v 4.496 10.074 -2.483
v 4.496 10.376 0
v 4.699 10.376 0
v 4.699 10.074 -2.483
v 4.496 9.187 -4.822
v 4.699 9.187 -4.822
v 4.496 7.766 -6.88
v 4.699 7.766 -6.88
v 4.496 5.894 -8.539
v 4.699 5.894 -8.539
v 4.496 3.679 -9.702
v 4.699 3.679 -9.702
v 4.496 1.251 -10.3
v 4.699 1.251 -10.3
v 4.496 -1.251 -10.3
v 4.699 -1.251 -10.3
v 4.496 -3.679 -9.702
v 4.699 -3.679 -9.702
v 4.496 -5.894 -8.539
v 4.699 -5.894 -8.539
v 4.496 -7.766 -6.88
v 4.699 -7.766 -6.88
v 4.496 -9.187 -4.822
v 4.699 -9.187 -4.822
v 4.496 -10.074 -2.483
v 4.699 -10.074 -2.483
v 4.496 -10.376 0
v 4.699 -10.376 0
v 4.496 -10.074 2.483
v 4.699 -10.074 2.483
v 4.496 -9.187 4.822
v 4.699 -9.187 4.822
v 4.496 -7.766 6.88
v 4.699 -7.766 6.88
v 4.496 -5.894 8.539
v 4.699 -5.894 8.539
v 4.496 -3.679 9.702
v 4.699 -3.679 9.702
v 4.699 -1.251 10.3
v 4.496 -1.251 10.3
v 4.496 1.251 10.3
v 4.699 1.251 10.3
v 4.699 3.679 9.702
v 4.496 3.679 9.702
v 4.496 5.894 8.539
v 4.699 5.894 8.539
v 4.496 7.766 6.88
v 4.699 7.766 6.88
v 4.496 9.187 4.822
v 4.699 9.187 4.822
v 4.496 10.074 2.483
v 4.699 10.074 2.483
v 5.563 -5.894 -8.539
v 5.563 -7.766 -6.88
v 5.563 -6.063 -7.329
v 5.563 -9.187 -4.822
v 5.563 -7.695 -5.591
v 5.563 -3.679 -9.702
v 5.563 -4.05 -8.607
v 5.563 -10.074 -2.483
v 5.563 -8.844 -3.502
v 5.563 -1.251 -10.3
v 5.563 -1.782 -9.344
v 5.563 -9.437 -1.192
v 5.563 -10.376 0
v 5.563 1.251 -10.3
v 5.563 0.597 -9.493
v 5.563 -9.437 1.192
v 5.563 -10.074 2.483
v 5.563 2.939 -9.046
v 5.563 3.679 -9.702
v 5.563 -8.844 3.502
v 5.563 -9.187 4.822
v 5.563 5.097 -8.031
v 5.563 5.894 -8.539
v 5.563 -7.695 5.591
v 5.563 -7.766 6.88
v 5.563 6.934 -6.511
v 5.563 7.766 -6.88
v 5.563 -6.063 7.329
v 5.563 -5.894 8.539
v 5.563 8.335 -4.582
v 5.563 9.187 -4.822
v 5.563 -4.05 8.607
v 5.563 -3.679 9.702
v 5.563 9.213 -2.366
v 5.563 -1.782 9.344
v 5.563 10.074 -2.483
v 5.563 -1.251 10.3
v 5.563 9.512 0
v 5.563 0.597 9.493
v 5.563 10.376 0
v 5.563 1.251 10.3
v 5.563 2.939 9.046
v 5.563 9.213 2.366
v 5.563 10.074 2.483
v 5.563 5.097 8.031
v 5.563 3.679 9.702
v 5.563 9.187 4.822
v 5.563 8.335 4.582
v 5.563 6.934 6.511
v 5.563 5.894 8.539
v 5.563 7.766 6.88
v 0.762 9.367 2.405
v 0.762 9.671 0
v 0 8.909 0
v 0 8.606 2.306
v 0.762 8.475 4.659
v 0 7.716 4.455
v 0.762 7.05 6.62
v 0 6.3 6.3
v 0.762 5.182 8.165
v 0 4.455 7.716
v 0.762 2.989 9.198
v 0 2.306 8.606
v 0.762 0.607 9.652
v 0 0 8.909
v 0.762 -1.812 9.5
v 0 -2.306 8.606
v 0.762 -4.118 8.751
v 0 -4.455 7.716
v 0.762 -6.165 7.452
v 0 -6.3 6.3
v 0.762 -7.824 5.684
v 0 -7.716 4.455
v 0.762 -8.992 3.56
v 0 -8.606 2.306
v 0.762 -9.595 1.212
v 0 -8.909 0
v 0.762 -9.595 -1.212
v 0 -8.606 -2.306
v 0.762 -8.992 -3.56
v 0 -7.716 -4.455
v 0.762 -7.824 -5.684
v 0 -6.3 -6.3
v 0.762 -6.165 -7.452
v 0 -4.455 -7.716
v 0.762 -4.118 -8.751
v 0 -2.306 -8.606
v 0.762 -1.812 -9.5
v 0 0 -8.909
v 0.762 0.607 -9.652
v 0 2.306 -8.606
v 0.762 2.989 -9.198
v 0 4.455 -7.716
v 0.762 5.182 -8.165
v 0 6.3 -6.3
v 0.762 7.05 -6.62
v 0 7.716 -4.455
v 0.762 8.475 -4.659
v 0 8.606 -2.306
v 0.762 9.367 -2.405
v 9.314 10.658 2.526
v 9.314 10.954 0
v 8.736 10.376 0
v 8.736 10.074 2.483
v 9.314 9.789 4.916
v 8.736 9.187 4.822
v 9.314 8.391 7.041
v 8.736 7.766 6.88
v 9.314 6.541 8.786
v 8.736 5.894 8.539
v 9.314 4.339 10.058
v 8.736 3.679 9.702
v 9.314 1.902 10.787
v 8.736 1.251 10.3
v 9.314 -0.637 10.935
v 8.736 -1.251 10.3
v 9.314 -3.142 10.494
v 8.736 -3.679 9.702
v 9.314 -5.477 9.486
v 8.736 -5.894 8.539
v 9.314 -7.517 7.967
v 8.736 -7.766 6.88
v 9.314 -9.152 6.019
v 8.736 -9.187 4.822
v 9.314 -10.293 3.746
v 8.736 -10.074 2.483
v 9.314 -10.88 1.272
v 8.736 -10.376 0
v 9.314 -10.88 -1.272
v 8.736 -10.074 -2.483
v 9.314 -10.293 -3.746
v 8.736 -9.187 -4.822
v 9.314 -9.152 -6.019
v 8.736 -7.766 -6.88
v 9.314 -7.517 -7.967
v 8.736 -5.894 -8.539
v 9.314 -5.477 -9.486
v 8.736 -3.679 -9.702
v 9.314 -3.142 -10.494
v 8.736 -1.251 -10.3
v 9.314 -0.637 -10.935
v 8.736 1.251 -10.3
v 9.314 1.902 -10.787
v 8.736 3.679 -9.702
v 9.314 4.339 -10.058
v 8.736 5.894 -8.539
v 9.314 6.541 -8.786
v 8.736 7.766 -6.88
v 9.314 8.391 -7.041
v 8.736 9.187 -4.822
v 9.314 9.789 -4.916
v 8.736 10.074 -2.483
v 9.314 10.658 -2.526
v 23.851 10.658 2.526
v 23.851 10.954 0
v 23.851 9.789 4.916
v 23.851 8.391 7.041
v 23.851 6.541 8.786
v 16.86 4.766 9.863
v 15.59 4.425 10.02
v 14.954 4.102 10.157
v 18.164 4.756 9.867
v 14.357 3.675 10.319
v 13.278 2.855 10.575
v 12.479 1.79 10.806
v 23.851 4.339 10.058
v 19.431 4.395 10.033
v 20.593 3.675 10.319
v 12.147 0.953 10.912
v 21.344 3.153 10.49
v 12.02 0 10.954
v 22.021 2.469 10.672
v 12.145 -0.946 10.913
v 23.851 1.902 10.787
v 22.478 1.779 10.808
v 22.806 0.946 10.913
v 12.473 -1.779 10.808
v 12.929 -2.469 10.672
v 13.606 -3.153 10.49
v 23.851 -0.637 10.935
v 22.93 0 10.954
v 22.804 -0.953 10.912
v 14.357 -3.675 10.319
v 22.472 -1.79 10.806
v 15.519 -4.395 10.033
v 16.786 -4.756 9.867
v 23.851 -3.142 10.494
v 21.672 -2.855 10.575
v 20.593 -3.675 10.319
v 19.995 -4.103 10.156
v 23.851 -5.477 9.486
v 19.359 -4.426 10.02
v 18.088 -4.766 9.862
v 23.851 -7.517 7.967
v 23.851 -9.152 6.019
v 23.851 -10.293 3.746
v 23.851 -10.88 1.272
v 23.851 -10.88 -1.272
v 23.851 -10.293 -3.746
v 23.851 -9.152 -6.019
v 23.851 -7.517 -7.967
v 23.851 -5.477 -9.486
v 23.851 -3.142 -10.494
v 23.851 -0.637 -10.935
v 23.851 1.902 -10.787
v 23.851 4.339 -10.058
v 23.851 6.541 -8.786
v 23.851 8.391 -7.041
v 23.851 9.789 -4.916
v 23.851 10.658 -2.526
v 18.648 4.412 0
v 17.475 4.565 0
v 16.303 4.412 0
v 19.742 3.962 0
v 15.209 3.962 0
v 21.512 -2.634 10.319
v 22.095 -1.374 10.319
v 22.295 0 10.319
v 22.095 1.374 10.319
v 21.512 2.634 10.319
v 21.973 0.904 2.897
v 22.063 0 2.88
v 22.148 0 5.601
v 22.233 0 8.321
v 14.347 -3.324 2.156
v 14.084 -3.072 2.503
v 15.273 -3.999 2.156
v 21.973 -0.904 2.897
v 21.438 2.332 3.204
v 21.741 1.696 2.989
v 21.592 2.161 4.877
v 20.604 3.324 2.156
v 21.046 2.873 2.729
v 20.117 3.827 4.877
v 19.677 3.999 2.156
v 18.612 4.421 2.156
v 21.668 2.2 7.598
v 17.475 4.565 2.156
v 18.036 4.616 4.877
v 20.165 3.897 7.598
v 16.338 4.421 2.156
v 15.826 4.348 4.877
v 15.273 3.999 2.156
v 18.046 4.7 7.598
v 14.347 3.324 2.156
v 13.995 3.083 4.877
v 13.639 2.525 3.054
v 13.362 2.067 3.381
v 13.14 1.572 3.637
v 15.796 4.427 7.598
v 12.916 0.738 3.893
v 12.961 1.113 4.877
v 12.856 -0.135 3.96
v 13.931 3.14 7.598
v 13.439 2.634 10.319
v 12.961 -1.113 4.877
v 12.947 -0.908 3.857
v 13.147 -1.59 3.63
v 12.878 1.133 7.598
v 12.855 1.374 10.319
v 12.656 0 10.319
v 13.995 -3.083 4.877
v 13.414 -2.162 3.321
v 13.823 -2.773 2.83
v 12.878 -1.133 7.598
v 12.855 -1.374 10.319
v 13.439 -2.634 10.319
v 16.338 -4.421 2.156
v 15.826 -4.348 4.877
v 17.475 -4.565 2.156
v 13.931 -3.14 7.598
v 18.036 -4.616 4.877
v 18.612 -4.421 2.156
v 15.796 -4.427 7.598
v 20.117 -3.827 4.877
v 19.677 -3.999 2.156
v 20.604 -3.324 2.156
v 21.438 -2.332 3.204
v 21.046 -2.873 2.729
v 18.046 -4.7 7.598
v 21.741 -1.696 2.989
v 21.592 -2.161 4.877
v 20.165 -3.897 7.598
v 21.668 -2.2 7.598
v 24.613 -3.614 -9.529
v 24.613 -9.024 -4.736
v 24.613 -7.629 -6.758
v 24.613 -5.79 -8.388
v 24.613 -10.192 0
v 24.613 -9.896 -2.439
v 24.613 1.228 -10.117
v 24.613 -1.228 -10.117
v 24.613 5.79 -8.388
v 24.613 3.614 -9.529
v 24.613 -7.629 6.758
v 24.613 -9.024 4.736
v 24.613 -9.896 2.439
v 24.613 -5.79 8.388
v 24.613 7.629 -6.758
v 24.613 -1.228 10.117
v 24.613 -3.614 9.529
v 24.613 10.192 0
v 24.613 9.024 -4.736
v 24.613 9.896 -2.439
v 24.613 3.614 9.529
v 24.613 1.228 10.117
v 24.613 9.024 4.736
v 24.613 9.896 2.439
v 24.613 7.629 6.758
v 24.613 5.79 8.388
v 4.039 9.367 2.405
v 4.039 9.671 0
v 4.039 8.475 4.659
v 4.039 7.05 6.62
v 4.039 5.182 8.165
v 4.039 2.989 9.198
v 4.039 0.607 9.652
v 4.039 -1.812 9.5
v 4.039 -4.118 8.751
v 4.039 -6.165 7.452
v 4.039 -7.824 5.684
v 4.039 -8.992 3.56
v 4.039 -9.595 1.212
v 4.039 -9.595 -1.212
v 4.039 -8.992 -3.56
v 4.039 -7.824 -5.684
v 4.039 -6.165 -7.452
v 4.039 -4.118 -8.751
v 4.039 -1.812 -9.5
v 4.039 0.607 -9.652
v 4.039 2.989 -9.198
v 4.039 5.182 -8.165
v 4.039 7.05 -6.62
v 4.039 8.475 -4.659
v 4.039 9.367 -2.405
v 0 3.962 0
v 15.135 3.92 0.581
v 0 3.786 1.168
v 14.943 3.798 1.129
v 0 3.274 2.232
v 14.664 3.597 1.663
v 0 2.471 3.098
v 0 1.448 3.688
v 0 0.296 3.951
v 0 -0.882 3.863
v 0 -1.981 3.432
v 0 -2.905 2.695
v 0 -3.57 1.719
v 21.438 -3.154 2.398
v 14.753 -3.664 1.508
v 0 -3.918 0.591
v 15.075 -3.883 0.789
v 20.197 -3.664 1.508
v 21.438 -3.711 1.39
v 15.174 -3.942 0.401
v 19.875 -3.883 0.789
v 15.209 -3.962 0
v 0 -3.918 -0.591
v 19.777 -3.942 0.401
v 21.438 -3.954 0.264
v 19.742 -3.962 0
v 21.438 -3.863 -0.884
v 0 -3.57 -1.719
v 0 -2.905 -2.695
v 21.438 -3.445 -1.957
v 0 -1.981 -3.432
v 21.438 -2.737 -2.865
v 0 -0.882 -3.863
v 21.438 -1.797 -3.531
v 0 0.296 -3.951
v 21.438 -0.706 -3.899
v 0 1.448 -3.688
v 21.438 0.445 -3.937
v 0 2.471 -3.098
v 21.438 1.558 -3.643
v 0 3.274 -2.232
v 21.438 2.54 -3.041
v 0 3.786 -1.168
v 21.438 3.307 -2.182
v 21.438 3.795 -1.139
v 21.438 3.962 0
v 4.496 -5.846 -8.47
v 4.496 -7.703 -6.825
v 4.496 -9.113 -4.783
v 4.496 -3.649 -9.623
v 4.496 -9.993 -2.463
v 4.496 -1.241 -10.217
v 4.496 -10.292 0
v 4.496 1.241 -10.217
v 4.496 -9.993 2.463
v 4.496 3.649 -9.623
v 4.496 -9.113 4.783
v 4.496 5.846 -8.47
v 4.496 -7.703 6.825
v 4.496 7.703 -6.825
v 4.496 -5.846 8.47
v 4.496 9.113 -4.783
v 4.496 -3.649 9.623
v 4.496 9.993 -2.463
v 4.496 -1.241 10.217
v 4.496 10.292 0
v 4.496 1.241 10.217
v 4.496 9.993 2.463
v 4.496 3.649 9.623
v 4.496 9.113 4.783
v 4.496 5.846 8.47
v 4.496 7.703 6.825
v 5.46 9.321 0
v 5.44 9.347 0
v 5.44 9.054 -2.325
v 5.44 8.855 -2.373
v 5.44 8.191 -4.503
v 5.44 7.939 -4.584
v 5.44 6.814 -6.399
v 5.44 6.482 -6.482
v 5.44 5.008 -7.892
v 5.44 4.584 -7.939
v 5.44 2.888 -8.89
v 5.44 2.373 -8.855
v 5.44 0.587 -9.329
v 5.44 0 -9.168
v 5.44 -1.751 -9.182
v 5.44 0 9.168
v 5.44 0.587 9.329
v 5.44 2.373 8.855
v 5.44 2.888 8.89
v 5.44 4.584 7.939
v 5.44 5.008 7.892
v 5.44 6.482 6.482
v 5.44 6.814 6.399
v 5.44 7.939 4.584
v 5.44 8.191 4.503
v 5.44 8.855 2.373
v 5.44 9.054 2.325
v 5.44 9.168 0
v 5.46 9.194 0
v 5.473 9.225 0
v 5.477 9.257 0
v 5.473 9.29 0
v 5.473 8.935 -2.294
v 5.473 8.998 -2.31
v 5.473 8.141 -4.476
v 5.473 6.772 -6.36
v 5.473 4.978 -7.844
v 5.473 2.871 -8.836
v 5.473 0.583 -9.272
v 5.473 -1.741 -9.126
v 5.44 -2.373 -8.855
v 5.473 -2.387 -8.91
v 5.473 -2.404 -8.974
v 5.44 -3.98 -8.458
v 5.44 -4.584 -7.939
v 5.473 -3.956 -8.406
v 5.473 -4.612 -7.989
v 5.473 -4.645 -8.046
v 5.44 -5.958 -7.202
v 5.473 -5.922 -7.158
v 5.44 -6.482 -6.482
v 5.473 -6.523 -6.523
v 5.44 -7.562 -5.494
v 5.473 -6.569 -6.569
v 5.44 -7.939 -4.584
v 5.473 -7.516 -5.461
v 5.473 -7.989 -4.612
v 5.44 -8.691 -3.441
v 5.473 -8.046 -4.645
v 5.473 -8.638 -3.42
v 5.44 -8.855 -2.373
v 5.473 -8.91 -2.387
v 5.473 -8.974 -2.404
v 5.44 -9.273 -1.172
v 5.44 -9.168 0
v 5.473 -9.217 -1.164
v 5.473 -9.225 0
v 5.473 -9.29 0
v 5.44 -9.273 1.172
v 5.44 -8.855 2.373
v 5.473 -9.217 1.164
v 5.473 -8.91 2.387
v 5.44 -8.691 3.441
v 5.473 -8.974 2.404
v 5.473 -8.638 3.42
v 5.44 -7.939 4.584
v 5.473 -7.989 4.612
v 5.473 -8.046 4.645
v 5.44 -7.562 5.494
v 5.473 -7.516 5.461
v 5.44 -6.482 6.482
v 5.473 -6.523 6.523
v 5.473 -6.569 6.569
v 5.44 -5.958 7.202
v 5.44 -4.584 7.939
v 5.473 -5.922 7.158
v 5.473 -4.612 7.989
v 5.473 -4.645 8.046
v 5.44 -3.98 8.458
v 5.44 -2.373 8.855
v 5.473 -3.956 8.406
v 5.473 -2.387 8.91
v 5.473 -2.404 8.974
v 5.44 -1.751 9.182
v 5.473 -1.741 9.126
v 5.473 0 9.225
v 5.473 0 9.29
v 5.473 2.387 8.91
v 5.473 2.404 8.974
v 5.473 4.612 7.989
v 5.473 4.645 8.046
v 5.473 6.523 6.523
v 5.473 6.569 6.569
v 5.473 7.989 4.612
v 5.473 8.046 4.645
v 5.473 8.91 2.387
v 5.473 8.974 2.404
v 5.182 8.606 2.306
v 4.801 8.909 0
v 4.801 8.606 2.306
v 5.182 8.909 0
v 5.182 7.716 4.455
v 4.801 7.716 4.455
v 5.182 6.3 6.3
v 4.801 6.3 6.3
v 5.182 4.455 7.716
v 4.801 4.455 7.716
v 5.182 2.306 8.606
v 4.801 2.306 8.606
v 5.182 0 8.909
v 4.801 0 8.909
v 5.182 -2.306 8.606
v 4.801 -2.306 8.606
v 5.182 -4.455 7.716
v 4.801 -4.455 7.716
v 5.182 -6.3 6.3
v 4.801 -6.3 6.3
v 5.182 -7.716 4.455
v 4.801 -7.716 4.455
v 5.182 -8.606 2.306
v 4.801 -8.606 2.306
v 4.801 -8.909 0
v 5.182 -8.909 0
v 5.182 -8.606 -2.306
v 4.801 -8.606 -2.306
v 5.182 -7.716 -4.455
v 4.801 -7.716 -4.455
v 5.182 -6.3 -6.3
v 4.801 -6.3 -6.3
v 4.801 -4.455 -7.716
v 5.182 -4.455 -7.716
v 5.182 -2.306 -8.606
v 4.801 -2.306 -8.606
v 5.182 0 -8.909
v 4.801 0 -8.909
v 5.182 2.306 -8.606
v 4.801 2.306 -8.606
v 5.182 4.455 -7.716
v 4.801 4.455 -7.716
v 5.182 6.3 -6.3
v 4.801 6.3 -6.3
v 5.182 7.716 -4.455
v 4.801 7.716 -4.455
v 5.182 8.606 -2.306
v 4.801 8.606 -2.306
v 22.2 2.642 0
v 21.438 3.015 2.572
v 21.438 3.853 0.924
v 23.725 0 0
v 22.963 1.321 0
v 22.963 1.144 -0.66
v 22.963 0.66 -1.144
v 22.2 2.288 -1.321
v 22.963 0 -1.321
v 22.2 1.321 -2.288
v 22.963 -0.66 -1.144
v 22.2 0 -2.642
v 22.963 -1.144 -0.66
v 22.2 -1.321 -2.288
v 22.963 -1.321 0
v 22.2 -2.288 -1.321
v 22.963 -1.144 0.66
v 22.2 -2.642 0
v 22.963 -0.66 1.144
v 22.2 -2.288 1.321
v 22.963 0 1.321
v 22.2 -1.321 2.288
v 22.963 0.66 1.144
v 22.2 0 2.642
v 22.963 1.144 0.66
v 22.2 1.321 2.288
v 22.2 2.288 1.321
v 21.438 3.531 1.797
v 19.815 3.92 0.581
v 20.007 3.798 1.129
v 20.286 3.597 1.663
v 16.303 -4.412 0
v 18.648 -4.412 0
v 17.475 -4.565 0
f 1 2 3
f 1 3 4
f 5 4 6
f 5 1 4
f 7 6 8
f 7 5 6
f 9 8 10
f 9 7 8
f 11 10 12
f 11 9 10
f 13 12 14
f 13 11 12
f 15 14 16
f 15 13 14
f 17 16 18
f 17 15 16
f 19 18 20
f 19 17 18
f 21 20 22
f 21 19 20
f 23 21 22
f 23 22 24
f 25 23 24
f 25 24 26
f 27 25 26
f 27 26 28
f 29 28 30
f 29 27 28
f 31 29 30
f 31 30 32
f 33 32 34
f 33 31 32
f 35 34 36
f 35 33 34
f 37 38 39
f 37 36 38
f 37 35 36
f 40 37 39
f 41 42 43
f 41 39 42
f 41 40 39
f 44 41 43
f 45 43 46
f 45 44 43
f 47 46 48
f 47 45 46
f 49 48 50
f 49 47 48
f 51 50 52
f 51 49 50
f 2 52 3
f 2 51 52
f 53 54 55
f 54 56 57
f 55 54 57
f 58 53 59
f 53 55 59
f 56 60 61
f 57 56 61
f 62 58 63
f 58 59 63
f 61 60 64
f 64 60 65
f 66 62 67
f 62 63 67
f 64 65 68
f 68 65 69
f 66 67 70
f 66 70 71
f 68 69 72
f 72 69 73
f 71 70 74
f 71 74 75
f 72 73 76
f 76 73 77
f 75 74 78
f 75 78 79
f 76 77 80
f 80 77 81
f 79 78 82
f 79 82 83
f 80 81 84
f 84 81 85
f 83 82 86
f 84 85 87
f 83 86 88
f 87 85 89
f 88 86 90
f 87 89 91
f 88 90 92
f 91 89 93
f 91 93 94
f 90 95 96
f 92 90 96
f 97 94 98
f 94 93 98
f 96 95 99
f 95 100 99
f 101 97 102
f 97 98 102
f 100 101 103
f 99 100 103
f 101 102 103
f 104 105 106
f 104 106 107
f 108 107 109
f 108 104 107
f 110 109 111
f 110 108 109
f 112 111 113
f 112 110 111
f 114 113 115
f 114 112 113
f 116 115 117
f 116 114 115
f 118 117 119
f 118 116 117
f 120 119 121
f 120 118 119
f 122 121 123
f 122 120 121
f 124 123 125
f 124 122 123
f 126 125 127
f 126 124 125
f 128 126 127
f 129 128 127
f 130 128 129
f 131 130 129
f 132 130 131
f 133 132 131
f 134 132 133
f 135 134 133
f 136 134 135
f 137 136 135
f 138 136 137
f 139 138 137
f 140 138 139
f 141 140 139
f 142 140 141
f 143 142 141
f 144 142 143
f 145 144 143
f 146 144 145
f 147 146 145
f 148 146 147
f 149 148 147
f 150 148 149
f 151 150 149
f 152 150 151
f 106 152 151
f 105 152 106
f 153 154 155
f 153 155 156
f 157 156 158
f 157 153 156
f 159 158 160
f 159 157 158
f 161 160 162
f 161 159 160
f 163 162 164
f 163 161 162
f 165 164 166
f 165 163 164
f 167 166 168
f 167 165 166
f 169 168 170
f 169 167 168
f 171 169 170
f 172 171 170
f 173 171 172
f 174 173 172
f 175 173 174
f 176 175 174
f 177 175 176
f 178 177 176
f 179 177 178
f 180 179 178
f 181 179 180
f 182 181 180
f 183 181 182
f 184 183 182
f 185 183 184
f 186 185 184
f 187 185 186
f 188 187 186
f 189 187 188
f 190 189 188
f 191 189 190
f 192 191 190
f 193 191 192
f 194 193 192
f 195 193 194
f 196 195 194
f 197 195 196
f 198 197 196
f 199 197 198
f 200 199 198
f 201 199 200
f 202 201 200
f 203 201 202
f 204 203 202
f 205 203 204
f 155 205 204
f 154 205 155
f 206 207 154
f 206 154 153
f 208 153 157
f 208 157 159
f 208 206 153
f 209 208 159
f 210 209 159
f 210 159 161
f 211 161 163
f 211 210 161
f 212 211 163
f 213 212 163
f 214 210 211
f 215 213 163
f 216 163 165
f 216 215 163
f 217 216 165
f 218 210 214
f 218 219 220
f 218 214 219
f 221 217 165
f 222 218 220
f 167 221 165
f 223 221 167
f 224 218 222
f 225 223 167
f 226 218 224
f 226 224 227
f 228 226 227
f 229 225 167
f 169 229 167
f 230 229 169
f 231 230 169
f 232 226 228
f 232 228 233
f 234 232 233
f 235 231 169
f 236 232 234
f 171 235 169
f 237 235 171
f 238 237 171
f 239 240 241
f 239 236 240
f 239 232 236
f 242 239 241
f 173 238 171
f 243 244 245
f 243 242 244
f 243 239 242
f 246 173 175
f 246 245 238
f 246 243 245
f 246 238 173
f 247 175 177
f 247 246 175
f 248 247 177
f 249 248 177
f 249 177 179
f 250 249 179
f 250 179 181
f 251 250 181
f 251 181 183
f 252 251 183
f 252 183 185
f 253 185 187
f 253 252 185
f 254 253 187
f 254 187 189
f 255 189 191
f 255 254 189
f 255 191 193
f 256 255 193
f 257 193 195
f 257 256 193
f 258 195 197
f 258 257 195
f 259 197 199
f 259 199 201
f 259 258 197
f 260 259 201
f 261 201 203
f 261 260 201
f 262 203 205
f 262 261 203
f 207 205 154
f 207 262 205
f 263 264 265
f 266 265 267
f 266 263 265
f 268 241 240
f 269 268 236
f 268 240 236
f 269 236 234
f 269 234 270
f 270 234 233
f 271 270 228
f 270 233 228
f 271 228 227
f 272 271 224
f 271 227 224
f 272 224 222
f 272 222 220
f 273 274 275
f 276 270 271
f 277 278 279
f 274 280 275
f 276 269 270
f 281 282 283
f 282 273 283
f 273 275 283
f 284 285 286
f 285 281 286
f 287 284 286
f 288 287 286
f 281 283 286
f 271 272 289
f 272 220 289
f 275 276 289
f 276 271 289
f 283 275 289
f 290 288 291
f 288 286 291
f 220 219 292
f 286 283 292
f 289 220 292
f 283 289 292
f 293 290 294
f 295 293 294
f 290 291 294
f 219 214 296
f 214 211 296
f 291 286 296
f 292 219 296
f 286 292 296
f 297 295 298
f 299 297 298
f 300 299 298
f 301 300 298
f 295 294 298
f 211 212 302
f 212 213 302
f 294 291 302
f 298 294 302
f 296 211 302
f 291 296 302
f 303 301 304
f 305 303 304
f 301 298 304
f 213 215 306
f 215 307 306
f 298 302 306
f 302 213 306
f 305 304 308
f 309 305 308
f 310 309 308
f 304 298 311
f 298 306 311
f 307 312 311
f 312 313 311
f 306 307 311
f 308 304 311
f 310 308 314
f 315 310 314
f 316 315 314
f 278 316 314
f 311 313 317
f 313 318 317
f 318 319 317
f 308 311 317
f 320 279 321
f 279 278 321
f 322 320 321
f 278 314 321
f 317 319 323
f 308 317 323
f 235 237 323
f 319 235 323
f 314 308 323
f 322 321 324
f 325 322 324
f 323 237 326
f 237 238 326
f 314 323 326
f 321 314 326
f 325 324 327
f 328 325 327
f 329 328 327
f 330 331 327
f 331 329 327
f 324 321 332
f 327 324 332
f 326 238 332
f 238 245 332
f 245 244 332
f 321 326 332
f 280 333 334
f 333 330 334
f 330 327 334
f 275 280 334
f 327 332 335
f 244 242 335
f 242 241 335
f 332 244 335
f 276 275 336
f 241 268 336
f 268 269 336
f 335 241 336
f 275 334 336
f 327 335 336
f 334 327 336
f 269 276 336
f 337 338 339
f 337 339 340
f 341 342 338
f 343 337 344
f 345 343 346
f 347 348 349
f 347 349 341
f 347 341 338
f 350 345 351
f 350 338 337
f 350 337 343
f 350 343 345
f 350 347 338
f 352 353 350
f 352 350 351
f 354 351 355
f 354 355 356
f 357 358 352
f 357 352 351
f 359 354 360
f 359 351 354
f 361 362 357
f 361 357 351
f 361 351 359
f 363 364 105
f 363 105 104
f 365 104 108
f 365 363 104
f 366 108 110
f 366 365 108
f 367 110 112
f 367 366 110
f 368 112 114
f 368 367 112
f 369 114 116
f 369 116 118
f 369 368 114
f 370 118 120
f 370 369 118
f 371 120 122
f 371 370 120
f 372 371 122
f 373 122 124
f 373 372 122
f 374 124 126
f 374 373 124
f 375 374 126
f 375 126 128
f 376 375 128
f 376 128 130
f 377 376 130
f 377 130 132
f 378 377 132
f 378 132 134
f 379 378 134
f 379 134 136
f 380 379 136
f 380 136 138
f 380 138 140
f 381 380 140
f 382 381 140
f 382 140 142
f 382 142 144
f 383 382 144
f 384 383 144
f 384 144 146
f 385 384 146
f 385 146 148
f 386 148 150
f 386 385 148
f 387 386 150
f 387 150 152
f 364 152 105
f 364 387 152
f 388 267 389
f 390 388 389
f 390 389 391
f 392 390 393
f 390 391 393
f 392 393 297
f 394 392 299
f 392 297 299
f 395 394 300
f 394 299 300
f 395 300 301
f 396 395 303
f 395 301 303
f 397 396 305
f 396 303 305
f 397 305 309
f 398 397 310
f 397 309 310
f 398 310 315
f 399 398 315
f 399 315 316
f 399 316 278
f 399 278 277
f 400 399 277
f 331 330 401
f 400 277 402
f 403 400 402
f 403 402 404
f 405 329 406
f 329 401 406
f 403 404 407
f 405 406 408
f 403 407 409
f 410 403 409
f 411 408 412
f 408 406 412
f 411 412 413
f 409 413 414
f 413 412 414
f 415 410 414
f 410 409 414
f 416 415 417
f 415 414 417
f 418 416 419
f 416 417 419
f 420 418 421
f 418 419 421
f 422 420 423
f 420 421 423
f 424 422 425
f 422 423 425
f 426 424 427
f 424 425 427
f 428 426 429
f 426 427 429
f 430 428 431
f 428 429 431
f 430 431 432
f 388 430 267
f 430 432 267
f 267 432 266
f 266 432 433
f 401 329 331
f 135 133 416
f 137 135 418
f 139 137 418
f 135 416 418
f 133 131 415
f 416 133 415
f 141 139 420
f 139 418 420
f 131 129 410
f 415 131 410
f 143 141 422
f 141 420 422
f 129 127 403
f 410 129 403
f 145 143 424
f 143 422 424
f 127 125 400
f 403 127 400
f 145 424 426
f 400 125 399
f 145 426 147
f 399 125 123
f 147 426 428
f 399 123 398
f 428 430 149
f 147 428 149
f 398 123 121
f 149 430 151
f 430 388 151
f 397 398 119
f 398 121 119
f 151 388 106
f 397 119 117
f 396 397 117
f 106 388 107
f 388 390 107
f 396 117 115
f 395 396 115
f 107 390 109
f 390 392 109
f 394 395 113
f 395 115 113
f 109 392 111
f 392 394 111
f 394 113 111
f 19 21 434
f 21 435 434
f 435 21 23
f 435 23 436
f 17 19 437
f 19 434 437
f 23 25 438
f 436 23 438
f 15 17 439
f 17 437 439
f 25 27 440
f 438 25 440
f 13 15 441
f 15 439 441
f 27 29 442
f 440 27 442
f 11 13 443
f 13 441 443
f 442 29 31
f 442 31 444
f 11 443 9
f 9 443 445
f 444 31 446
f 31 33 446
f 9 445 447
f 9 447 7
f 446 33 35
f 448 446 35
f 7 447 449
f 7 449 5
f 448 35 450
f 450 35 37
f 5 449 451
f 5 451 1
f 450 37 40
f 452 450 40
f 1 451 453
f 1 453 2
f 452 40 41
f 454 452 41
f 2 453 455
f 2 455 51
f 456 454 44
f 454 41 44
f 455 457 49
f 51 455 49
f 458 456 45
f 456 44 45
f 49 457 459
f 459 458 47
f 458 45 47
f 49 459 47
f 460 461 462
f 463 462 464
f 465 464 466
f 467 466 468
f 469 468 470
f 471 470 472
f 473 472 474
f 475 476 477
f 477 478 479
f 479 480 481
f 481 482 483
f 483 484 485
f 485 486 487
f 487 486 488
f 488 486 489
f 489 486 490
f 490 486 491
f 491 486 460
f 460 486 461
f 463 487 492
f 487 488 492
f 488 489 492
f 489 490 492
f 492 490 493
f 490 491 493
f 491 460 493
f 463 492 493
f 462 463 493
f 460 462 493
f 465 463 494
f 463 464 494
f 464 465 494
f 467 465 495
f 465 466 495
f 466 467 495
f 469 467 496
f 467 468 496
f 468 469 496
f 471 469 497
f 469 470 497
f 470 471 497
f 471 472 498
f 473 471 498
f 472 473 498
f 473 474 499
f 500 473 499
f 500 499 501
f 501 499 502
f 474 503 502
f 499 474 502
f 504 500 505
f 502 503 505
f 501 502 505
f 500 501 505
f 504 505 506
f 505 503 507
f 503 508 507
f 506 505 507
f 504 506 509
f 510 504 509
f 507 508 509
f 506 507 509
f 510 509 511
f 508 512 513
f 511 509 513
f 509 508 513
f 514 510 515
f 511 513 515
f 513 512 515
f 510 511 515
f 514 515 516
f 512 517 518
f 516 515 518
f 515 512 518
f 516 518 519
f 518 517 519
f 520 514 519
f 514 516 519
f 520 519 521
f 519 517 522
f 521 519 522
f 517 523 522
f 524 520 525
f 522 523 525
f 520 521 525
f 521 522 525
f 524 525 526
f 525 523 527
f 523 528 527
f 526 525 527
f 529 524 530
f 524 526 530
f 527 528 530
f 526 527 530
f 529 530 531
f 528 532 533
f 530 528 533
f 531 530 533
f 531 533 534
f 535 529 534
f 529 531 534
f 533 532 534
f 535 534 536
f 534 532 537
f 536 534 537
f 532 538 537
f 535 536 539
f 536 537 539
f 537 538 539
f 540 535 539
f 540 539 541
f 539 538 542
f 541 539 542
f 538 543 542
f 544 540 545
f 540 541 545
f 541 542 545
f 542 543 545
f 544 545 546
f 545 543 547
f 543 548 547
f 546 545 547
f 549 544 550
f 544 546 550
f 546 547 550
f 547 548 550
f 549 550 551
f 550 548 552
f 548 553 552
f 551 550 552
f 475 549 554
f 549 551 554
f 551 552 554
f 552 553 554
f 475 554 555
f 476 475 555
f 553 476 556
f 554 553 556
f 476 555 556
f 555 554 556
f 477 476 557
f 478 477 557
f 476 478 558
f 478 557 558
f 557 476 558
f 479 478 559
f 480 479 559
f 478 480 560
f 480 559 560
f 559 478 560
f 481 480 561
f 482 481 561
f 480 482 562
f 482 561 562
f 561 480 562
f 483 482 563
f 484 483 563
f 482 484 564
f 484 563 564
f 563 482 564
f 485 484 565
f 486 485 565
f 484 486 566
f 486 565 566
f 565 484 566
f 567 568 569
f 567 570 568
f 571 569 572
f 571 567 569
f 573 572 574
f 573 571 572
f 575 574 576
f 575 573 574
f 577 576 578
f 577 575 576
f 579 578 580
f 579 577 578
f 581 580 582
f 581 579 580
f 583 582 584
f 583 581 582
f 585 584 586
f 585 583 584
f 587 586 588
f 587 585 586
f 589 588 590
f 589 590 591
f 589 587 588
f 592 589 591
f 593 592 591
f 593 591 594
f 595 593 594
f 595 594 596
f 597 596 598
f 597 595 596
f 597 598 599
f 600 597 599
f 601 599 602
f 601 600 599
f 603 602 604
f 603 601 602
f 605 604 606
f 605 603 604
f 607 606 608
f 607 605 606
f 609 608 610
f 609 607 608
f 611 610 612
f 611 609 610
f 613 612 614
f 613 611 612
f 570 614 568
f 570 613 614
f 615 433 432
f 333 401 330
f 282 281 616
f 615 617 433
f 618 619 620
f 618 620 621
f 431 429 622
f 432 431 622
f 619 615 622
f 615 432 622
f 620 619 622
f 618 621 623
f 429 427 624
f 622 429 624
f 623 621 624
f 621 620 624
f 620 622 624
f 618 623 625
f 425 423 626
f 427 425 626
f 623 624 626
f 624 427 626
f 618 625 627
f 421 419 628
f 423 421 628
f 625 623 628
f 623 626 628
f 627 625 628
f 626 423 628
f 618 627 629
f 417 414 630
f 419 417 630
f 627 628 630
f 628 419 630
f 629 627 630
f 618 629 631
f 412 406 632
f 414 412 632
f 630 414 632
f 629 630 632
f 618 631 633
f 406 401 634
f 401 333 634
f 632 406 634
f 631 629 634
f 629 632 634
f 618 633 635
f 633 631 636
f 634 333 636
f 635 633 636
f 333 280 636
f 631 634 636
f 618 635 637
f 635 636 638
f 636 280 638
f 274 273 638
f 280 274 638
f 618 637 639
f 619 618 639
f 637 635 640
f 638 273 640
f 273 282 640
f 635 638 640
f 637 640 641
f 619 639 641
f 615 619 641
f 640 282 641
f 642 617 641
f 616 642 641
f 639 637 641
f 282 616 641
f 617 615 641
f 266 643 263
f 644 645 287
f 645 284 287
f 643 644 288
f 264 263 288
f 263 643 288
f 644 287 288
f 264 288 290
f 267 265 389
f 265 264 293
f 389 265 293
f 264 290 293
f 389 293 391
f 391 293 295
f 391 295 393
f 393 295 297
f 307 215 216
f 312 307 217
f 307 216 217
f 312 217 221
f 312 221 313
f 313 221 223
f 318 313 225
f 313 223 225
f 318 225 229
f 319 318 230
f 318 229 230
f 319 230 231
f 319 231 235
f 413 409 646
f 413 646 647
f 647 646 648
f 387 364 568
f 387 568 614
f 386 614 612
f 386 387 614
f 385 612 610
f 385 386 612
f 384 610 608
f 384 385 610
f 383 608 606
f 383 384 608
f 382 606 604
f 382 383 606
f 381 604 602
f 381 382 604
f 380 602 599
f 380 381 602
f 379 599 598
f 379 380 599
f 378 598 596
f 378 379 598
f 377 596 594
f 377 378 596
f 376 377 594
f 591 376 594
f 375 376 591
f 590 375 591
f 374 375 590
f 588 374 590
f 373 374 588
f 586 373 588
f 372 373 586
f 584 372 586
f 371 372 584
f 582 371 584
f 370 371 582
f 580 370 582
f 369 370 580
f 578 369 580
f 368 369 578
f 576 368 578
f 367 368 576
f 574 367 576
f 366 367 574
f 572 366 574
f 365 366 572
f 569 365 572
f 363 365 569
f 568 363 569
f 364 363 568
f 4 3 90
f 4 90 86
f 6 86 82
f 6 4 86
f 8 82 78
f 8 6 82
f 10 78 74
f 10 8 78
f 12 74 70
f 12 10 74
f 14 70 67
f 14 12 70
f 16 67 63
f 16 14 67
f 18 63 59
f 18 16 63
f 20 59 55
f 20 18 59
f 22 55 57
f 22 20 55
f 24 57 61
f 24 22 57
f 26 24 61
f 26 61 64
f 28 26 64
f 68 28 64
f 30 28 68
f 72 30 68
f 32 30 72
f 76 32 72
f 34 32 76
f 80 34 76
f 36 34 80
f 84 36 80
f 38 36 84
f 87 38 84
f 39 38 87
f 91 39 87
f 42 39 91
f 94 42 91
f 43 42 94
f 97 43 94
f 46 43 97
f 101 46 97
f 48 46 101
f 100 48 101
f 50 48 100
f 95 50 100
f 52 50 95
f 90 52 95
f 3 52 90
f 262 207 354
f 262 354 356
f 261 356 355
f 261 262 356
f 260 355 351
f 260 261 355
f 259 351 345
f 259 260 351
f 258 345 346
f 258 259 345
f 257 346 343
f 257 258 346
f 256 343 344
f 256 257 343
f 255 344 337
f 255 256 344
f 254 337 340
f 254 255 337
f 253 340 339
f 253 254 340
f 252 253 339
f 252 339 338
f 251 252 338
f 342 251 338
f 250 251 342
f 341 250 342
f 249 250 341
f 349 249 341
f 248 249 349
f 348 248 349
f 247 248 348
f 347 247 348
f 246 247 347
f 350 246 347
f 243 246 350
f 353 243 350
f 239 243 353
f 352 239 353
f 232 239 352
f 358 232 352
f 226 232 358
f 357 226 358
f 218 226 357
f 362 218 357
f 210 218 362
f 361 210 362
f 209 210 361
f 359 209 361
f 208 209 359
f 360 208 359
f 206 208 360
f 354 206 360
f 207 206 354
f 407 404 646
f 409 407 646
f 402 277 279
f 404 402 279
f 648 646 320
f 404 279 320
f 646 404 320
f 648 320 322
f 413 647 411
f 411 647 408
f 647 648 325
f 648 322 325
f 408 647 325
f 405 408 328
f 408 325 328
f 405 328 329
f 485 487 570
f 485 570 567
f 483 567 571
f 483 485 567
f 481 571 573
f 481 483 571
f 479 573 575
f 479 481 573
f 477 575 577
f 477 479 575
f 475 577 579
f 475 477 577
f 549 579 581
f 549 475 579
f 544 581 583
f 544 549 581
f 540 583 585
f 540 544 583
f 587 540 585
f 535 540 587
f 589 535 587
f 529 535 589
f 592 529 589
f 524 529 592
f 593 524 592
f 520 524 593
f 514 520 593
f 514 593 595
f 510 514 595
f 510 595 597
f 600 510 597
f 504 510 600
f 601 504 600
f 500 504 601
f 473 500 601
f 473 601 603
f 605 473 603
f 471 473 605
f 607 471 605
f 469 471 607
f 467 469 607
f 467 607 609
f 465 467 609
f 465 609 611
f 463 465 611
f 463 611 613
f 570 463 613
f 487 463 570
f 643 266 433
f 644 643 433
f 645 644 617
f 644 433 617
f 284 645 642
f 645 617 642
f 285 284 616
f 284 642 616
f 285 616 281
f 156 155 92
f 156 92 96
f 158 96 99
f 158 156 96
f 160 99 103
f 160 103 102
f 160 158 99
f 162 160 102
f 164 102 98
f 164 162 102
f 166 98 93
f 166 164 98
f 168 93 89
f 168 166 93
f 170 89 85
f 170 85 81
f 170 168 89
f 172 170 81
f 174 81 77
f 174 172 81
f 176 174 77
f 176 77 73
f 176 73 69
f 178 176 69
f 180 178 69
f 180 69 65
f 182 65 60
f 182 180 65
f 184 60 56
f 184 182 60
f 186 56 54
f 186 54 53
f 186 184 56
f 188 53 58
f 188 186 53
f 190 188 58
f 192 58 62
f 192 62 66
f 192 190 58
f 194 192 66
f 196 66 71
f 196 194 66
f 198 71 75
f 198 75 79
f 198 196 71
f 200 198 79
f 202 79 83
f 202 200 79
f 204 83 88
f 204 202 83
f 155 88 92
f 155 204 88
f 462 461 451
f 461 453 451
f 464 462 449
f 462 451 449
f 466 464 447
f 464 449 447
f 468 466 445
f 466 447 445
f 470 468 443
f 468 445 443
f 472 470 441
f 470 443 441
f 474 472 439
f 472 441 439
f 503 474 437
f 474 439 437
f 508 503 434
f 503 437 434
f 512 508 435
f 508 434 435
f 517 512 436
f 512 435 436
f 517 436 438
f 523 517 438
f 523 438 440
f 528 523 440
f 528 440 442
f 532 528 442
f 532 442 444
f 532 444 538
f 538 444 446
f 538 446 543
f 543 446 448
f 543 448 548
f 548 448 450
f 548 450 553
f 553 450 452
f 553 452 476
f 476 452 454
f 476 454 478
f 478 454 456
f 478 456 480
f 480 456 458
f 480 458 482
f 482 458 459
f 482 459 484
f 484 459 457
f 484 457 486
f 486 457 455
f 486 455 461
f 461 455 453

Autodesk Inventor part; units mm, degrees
sketch "Sketch_8" plane through (0, 0, 0) normal (0, 0, 1) x (1, 0, 0)
  line L0 (24.6126, 0) -> (0, 0)
  line L1 (0, 0) -> (0, 8.9091)
  line L2 (0, 8.9091) -> (0.762, 9.671)
  line L3 (0.762, 9.671) -> (4.0386, 9.671)
  line L4 (4.0386, 9.671) -> (4.8006, 8.9091)
  line L5 (4.8006, 8.9091) -> (5.5626, 8.9091)
  line L6 (5.5626, 8.9091) -> (5.5626, 10.3759)
  line L7 (5.5626, 10.3759) -> (8.7363, 10.3759)
  line L8 (8.7363, 10.3759) -> (9.3142, 10.9537)
  line L9 (9.3142, 10.9537) -> (23.8506, 10.9537)
  line L10 (23.8506, 10.9537) -> (24.6126, 10.1918)
  line L11 (24.6126, 10.1918) -> (24.6126, 0)
  line L12 (24.6126, 0) -> (0, 0)
revolve "Revolution1" add sketch "Sketch_8" angle 360 about axis through (24.6126, 0, 0) along (1, 0, 0)
sketch "Sketch_13" plane through (0, 0, 0) normal (0, 0, 1) x (1, 0, 0)
  line L0 (23.7253, 0) -> (0, 0)
  line L1 (0, 0) -> (0, 3.9624)
  line L2 (0, 3.9624) -> (21.4376, 3.9624)
  line L3 (21.4376, 3.9624) -> (23.7253, 0)
  line L4 (23.7253, 0) -> (0, 0)
revolve "Revolution2" cut sketch "Sketch_13" angle 360 about axis through (23.7253, 0, 0) along (1, 0, 0)
sketch "Sketch_19" plane through (0, 0, 0) normal (0, 1, 0) x (-1, 0, 0)
  line L0 (-17.4752, 10.9537) -> (-17.4752, 0)
  line L1 (-17.4752, 0) -> (-22.04, 0)
  line L2 (-22.04, 0) -> (-22.04, 2.1565)
  line L3 (-22.04, 2.1565) -> (-22.2949, 10.3187)
  line L4 (-22.2949, 10.3187) -> (-22.9299, 10.9537)
  line L5 (-22.9299, 10.9537) -> (-17.4752, 10.9537)
  line L6 (-17.4752, 10.9537) -> (-17.4752, 0)
revolve "Revolution3" cut sketch "Sketch_19" angle 360 about axis through (17.4752, 0, 10.9537) along (0, 0, 1)
sketch "Sketch_24" plane through (0, 0, 0) normal (0, 0, 1) x (1, 0, 0)
  line L0 (5.5626, 0) -> (4.8006, 0)
  line L1 (4.4955, 10.2917) -> (5.4401, 9.3472)
  arc A0 (5.4401, 9.1676) -> (5.4401, 9.3472) centre (5.3503, 9.2574) ccw
  line L2 (5.4401, 9.1676) -> (5.1816, 8.9091)
  line L3 (5.1816, 8.9091) -> (4.8006, 8.9091)
  line L4 (4.8006, 8.9091) -> (4.8006, 8.655)
  line L5 (4.8006, 8.655) -> (5.5626, 8.655)
  line L6 (5.5626, 8.655) -> (5.5626, 9.512)
  line L7 (5.5626, 9.512) -> (4.6987, 10.3759)
  line L8 (4.6987, 10.3759) -> (4.4955, 10.3759)
  line L9 (4.4955, 10.3759) -> (4.4955, 10.2917)
revolve "Revolution4" add sketch "Sketch_24" angle 360 about axis through (5.5626, 0, 0) along (1, 0, 0)
ref_plane "to_tube_XY" through (4.8006, 0, 0) normal (1, 0, 0) x (0, 0, -1)
ref_plane "to_tube_YZ" through (4.8006, 0, 0) normal (0, 0, -1) x (0, 1, 0)
ref_plane "to_tube_ZX" through (4.8006, 0, 0) normal (0, 1, 0) x (1, 0, 0)
ref_plane "to_nut_XY" through (27.0002, 0, 0) normal (1, 0, 0) x (0, 0, -1)
ref_plane "to_nut_YZ" through (27.0002, 0, 0) normal (0, 0, -1) x (0, 1, 0)
ref_plane "to_nut_ZX" through (27.0002, 0, 0) normal (0, 1, 0) x (1, 0, 0)
ref_plane "lovra1_XY" through (35.7124, 0, 0) normal (1, 0, 0) x (0, 0, -1)
ref_plane "lovra1_YZ" through (35.7124, 0, 0) normal (0, 0, -1) x (0, 1, 0)
ref_plane "lovra1_ZX" through (35.7124, 0, 0) normal (0, 1, 0) x (1, 0, 0)
ref_plane "lovra2_XY" through (35.7124, 7.874, 0) normal (1, 0, 0) x (0, 0, -1)
ref_plane "lovra2_YZ" through (35.7124, 7.874, 0) normal (0, 0, -1) x (0, 1, 0)
ref_plane "lovra2_ZX" through (35.7124, 7.874, 0) normal (0, 1, 0) x (1, 0, 0)
ref_plane "lovra3_XY" through (35.7124, -7.874, 0) normal (1, 0, 0) x (0, 0, -1)
ref_plane "lovra3_YZ" through (35.7124, -7.874, 0) normal (0, 0, -1) x (0, 1, 0)
ref_plane "lovra3_ZX" through (35.7124, -7.874, 0) normal (0, 1, 0) x (1, 0, 0)
ref_plane "olen_XY" through (24.6126, 0, 0) normal (1, 0, 0) x (0, 0, -1)
ref_plane "olen_YZ" through (24.6126, 0, 0) normal (0, 0, -1) x (0, 1, 0)
ref_plane "olen_ZX" through (24.6126, 0, 0) normal (0, 1, 0) x (1, 0, 0)
ref_plane "port2_XY" through (24.6126, 0, 0) normal (1, 0, 0) x (0, 0, -1)
ref_plane "port2_YZ" through (24.6126, 0, 0) normal (0, 0, -1) x (0, 1, 0)
ref_plane "port2_ZX" through (24.6126, 0, 0) normal (0, 1, 0) x (1, 0, 0)
ref_plane "port_XY" through (17.4752, 0, 0) normal (0, 0, 1) x (1, 0, 0)
ref_plane "port_YZ" through (17.4752, 0, 0) normal (1, 0, 0) x (0, 1, 0)
ref_plane "port_ZX" through (17.4752, 0, 0) normal (0, 1, 0) x (0, 0, 1)
ref_plane "lovra21_XY" through (0, 0, 5.2705) normal (1, 0, 0) x (0, 0, -1)
ref_plane "lovra21_YZ" through (0, 0, 5.2705) normal (0, 0, -1) x (0, 1, 0)
ref_plane "lovra21_ZX" through (0, 0, 5.2705) normal (0, 1, 0) x (1, 0, 0)
ref_plane "lovra22_XY" through (0, 0, -5.2705) normal (1, 0, 0) x (0, 0, -1)
ref_plane "lovra22_YZ" through (0, 0, -5.2705) normal (0, 0, -1) x (0, 1, 0)
ref_plane "lovra22_ZX" through (0, 0, -5.2705) normal (0, 1, 0) x (1, 0, 0)
ref_plane "to_screw_XY" through (17.4752, 2.032, -6.0452) normal (0, 1, 0) x (1, 0, 0)
ref_plane "to_screw_YZ" through (17.4752, 2.032, -6.0452) normal (1, 0, 0) x (0, 0, -1)
ref_plane "to_screw_ZX" through (17.4752, 2.032, -6.0452) normal (0, 0, -1) x (0, 1, 0)
ref_plane "to_mounting_bracket_XY" through (24.6126, 0, 0) normal (1, 0, 0) x (0, 0, -1)
ref_plane "to_mounting_bracket_YZ" through (24.6126, 0, 0) normal (0, 0, -1) x (0, 1, 0)
ref_plane "to_mounting_bracket_ZX" through (24.6126, 0, 0) normal (0, 1, 0) x (1, 0, 0)
properties part number "04PQ0000_rear_head"
